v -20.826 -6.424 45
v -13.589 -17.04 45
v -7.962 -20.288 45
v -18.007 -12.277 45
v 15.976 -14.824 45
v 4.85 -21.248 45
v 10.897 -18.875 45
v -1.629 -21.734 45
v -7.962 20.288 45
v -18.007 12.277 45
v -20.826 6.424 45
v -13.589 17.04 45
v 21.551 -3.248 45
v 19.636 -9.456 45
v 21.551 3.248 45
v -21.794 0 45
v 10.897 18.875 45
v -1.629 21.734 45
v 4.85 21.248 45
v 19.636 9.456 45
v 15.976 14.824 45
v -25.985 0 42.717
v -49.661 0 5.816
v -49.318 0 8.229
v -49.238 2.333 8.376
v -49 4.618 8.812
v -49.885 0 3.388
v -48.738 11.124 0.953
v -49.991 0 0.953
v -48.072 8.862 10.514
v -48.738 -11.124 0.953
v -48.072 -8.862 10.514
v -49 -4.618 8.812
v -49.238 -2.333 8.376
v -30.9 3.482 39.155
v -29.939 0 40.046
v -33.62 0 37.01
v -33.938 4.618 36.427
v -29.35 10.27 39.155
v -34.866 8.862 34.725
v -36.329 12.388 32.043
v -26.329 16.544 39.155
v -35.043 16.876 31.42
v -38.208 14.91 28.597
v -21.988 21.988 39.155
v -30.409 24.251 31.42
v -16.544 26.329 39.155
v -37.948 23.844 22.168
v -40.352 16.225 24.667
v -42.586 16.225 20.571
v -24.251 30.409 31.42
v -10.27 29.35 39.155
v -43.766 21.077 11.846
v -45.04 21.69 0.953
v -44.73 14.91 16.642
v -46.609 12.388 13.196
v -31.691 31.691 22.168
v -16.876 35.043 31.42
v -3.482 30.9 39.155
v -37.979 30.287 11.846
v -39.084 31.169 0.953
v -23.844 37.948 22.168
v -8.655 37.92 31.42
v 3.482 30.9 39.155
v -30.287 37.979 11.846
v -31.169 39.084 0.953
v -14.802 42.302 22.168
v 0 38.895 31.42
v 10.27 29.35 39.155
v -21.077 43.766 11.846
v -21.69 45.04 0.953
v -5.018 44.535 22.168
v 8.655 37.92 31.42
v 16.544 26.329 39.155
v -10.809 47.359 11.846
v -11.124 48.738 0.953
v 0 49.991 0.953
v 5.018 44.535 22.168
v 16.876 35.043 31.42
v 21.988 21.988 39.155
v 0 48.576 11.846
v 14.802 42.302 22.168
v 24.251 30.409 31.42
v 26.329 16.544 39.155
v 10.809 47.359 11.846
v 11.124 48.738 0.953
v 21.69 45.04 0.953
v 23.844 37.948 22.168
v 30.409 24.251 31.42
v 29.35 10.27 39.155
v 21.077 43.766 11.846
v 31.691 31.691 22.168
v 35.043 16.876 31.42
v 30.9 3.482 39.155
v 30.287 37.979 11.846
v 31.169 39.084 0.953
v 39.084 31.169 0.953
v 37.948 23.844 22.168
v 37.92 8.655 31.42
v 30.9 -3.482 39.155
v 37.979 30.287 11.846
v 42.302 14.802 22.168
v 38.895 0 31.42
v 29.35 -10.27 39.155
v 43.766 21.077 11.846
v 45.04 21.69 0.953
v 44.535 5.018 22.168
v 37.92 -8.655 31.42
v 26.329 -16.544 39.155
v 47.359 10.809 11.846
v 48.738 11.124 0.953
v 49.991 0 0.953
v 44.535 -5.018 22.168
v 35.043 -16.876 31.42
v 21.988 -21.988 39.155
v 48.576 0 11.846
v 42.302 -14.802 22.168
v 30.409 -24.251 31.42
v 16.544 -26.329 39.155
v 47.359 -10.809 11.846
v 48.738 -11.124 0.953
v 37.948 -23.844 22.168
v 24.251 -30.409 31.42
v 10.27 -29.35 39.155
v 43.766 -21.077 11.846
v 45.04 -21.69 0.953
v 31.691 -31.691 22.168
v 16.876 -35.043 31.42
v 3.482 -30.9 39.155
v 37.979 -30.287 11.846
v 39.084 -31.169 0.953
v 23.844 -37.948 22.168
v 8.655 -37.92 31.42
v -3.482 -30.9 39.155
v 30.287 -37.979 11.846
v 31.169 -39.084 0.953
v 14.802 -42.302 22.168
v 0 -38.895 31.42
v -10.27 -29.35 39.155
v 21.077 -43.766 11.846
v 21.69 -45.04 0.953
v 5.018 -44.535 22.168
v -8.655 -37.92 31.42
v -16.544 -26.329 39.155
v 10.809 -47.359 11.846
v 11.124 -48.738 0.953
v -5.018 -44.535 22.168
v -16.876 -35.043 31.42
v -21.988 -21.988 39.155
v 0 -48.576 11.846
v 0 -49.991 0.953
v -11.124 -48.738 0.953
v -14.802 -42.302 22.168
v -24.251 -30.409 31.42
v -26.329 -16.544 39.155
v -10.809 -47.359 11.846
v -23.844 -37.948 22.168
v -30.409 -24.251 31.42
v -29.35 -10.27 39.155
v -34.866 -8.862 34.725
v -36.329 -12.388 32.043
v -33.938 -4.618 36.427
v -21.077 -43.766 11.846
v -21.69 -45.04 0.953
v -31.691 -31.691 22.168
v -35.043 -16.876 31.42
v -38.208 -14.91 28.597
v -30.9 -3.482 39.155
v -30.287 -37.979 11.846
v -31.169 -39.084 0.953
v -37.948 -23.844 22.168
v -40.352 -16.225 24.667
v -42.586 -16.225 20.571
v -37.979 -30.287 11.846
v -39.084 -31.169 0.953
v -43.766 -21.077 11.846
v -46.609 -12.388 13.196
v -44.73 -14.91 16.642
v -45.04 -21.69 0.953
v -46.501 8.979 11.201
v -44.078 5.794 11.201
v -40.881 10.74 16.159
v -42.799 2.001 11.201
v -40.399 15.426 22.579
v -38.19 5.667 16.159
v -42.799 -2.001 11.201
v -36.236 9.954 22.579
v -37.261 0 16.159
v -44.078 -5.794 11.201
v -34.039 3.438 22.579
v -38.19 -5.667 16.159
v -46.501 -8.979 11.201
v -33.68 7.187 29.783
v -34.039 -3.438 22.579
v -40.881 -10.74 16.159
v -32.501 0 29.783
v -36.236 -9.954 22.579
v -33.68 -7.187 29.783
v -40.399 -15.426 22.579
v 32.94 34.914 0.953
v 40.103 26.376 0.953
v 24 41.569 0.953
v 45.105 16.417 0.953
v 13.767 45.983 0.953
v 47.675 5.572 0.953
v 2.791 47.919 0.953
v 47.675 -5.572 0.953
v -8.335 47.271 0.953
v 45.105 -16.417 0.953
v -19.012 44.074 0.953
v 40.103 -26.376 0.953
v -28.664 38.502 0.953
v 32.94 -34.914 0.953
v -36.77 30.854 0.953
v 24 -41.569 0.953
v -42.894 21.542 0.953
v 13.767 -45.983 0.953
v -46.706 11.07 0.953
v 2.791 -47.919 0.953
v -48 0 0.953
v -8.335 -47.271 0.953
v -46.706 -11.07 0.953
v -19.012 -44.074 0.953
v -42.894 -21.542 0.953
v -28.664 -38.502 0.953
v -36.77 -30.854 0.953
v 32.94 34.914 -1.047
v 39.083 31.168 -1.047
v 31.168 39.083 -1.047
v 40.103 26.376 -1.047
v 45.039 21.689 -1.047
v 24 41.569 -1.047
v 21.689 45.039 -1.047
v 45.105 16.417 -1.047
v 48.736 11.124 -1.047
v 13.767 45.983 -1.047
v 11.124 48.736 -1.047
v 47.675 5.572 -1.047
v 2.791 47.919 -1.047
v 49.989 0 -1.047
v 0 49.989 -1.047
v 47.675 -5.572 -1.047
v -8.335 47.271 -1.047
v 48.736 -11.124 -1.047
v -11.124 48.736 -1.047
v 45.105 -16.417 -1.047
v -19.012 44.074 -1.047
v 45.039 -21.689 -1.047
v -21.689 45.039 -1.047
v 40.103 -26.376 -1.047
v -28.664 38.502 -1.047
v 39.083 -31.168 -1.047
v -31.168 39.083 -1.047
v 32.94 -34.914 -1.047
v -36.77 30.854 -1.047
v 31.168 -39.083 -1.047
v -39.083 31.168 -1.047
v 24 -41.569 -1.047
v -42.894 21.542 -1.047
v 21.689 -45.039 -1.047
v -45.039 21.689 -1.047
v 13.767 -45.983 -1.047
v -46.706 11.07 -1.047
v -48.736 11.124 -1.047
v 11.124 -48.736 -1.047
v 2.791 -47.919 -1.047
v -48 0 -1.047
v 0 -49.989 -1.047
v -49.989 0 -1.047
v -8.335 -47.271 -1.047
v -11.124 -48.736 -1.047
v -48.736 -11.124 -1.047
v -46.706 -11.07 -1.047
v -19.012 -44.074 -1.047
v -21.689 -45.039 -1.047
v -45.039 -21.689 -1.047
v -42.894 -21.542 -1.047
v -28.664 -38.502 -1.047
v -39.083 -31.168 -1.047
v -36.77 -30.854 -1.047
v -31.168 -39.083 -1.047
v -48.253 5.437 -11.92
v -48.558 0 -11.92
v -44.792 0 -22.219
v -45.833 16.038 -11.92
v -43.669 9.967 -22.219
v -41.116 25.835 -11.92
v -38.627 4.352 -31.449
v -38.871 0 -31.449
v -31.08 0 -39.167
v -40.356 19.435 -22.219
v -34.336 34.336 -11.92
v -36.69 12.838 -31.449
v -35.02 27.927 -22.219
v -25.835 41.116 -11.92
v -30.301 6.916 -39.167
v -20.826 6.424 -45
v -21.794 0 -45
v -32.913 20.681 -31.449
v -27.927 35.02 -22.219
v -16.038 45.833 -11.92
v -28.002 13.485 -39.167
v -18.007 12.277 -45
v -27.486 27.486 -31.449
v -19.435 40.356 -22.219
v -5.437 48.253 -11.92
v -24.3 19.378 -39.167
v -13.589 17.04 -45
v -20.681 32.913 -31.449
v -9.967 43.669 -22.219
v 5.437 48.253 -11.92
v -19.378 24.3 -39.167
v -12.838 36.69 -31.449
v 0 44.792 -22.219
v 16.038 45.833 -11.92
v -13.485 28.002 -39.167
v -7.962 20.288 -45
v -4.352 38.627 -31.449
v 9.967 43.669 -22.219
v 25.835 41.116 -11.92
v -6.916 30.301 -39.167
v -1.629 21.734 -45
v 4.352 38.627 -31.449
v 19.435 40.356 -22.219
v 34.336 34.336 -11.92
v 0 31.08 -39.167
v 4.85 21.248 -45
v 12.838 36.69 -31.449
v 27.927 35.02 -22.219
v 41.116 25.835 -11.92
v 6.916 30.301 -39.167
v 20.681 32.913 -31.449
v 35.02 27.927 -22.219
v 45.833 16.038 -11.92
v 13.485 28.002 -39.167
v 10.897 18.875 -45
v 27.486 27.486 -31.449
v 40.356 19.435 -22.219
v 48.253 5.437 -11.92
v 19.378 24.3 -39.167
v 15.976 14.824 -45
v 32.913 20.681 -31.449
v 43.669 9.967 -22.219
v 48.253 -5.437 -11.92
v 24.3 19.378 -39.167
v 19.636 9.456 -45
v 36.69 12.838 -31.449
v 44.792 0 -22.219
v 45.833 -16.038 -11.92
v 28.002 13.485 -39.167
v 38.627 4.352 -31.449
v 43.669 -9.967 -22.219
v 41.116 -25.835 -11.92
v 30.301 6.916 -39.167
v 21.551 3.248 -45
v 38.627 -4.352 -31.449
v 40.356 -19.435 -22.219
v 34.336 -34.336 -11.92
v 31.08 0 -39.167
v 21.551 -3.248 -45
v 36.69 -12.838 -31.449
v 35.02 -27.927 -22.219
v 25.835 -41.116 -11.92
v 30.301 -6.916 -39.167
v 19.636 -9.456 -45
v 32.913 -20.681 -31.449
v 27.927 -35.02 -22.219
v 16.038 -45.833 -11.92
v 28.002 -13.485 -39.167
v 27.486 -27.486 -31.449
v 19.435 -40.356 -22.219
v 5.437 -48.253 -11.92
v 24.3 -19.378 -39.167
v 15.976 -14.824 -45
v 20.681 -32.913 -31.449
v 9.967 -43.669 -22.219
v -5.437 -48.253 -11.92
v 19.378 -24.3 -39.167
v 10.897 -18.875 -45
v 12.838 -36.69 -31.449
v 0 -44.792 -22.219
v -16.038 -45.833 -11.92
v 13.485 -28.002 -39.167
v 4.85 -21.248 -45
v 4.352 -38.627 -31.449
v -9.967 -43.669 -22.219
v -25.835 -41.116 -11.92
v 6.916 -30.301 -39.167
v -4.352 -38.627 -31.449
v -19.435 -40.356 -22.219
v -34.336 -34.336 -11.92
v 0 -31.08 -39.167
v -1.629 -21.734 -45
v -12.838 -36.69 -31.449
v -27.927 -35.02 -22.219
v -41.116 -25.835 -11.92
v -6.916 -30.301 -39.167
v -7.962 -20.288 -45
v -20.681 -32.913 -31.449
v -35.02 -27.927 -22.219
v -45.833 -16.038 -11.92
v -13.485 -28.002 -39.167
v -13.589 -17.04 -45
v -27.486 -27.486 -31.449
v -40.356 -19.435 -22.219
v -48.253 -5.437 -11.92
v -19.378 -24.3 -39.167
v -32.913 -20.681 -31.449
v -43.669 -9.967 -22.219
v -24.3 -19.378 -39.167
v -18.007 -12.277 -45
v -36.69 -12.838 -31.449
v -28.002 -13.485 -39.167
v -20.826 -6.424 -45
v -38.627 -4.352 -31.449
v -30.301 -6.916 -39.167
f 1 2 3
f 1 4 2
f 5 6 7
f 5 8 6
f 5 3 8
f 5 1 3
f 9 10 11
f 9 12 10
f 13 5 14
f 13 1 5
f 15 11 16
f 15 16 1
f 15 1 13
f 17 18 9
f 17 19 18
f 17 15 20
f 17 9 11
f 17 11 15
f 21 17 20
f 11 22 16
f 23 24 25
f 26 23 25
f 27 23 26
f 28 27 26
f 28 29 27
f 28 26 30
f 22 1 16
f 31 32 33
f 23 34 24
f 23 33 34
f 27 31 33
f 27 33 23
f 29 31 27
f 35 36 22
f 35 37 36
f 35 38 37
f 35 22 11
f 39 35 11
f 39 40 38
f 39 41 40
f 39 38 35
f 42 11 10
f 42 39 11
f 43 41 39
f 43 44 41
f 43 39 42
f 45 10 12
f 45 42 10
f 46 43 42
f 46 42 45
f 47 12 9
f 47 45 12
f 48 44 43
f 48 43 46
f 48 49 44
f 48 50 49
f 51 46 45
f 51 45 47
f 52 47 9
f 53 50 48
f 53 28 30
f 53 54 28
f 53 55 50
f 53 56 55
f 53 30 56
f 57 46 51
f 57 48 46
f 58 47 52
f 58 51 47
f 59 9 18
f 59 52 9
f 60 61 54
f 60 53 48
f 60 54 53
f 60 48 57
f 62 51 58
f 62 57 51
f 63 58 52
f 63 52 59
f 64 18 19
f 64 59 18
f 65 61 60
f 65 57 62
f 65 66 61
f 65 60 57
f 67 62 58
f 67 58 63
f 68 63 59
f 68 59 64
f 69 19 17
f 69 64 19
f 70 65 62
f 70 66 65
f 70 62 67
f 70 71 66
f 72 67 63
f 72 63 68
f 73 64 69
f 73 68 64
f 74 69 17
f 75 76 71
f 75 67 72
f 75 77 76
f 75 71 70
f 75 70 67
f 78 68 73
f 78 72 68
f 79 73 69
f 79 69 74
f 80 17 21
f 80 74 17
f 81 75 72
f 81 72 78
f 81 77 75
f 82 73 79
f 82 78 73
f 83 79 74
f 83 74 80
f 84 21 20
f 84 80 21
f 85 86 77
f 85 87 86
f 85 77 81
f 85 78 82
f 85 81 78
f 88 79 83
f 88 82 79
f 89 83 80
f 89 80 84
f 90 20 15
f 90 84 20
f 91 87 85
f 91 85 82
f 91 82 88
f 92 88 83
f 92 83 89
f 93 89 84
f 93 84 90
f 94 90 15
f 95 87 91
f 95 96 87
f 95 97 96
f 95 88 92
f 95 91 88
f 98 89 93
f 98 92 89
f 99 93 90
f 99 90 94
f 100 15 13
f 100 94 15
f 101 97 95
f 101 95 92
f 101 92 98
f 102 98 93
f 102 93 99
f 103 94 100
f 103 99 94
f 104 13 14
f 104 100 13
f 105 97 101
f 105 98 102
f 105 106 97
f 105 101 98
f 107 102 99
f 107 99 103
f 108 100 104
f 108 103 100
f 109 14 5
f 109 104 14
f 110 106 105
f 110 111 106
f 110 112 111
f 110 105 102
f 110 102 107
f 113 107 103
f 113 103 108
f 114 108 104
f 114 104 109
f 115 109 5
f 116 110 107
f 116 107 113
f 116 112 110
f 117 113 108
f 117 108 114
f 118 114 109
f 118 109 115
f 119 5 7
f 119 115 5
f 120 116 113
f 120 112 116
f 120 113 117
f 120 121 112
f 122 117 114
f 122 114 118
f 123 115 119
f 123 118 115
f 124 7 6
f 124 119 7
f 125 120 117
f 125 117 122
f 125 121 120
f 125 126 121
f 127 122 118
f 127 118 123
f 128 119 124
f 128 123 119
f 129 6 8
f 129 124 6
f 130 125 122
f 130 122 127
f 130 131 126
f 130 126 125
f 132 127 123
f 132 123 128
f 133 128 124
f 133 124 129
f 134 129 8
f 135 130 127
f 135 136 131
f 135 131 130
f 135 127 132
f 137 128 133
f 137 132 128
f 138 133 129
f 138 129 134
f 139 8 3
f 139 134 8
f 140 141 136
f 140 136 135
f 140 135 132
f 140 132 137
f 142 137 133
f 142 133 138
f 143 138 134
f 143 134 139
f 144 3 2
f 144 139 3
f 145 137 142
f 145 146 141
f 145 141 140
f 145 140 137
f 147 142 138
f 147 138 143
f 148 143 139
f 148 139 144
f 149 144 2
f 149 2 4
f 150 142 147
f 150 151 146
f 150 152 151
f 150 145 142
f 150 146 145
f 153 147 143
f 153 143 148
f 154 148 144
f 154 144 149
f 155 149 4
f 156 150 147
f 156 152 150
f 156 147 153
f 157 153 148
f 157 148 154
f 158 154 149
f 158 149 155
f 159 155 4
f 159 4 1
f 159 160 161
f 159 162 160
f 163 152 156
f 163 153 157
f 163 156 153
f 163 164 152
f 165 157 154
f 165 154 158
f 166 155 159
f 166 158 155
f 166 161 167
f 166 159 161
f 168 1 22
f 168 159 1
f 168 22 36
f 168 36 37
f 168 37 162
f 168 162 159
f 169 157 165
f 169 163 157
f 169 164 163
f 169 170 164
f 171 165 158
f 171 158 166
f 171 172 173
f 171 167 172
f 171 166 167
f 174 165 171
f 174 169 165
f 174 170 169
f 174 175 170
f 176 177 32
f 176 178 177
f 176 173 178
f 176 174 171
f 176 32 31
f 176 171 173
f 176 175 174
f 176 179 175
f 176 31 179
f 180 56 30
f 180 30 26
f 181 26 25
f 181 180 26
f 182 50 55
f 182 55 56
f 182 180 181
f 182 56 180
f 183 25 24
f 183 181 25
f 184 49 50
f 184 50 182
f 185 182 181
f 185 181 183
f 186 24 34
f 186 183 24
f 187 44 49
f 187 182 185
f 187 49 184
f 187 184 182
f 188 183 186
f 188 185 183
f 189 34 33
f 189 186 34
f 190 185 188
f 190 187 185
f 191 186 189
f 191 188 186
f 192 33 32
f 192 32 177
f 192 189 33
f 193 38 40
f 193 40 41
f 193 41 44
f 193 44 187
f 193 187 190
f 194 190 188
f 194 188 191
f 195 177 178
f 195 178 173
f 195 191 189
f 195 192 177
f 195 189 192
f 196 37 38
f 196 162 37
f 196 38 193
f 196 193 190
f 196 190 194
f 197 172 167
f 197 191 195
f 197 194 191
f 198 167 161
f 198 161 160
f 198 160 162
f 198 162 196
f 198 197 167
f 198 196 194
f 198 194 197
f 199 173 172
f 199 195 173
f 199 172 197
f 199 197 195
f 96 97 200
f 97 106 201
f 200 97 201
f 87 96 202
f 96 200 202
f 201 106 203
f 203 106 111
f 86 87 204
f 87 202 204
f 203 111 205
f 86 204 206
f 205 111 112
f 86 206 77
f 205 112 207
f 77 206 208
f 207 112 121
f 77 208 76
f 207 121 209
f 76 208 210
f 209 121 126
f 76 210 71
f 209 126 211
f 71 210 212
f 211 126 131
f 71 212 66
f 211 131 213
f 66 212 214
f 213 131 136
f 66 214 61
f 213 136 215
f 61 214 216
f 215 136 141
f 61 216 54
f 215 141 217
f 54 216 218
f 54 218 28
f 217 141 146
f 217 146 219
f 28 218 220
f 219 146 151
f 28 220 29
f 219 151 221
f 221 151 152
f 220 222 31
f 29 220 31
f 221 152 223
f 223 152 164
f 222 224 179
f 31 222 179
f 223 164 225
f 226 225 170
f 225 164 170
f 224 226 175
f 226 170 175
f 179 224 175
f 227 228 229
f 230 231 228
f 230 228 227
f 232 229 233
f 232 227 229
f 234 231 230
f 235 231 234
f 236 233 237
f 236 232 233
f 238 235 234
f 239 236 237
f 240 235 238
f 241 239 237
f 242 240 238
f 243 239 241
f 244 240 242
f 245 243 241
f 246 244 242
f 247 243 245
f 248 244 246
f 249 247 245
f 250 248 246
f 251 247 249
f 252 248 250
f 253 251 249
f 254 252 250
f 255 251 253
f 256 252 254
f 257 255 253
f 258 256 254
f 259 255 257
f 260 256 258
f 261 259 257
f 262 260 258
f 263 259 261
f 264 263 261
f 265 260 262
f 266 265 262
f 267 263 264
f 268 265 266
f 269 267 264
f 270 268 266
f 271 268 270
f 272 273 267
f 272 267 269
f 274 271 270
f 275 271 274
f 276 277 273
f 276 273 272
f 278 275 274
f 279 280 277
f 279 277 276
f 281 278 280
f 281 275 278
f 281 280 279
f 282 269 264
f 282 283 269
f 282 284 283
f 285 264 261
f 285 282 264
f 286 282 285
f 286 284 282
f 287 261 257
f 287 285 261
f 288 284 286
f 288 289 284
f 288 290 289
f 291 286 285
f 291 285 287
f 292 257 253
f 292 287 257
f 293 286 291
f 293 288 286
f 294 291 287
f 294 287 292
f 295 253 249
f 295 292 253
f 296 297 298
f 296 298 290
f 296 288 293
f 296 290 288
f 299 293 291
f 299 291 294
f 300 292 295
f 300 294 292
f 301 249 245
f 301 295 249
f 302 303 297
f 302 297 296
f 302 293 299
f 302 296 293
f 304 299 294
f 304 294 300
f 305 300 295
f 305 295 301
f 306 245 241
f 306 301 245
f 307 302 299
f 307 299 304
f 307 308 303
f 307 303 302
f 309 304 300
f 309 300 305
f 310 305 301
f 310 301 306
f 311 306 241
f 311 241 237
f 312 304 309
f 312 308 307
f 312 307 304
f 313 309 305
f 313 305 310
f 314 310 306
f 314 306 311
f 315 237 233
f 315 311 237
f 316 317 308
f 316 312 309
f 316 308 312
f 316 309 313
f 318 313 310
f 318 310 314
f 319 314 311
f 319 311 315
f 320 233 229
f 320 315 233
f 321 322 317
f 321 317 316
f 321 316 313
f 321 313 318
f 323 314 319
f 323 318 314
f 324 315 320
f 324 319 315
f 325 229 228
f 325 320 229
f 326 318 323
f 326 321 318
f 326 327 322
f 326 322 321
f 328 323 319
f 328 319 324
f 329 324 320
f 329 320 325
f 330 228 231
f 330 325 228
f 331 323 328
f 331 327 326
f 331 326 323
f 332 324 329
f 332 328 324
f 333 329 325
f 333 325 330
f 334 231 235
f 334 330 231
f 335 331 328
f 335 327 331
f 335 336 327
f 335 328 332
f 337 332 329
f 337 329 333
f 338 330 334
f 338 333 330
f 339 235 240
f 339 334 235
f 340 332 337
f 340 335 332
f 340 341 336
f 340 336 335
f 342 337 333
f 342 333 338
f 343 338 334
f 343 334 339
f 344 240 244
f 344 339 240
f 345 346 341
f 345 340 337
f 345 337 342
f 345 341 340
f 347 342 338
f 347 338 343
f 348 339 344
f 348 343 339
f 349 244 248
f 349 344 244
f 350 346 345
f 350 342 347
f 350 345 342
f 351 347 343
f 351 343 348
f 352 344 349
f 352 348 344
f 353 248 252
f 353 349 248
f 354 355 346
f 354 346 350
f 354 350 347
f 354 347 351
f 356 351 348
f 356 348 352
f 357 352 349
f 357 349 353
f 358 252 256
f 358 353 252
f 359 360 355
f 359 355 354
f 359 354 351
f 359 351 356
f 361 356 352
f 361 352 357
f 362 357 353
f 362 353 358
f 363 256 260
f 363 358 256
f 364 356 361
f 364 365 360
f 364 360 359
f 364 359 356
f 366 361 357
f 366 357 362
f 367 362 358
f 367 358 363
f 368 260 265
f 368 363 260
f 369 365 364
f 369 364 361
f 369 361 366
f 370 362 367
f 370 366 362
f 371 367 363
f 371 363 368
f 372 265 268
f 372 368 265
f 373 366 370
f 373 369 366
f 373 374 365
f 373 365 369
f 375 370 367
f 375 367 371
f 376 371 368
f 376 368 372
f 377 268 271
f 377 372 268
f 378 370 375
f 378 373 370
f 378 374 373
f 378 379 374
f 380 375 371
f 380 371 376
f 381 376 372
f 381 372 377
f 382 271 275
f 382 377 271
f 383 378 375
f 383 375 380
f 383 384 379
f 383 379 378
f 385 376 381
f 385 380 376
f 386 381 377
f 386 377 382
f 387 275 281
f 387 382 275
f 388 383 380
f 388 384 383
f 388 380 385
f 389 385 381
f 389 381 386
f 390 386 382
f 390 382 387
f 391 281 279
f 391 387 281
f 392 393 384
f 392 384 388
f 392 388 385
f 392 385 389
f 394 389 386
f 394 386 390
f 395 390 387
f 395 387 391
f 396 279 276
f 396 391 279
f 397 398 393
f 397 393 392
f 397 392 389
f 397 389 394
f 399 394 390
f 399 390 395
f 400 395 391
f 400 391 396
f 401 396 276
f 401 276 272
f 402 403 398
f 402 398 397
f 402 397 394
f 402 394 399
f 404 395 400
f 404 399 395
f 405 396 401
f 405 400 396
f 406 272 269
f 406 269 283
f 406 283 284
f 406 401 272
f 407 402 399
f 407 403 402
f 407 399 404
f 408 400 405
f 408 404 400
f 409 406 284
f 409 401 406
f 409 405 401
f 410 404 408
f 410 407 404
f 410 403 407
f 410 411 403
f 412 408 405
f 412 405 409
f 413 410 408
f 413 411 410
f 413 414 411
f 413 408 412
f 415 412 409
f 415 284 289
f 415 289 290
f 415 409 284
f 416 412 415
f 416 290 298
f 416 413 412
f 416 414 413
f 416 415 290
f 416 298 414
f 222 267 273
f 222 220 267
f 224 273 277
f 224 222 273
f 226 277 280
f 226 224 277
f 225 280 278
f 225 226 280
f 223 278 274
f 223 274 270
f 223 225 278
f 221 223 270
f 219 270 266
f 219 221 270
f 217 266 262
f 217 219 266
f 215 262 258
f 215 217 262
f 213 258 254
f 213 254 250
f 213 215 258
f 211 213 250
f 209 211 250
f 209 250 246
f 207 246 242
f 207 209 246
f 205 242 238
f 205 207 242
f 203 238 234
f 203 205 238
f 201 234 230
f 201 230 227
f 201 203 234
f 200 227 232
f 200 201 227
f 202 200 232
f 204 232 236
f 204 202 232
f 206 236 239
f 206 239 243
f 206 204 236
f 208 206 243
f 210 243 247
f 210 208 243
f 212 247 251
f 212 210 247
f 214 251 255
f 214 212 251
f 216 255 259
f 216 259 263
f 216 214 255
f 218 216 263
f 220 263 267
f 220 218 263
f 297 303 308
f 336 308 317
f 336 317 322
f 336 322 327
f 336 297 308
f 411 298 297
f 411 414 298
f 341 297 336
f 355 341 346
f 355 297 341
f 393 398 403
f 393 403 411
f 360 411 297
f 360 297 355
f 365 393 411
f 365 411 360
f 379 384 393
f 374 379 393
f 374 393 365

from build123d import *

# Parameters (mm, degrees)
F4_W          = 98.152165938
F4_H          = 19.5652123008
F5_DEPTH      = 25
F5_DEPTH_BACK = 25
F6_W          = 12.6501991157
F6_H          = 2


# Not quite as in the source:
# - a pattern or mirror of a feature is missing from the dataset's text; its kind, count and spacing are read off the source's solid


with BuildPart() as f1:
    # F0 (on Front) → F1 (revolve)
    with BuildSketch(Plane.XZ):
        with BuildLine():
            Line((0, -50), (0, 50))
            ThreePointArc((0, 50), (-50, 0), (0, -50))
        make_face()
    revolve(axis=Axis((0, 0, 0), (0, 0, -1)))

    # F2 (on Front) → F3 (revolve, cut)
    with BuildSketch(Plane.XZ):
        with BuildLine():
            Line((-55, 52.5), (-55, 7.5))
            ThreePointArc((-55, 7.5), (-32.5, 30), (-55, 52.5))
        make_face()
    revolve(axis=Axis((-55, 0, 30), (0, 0, -1)), mode=Mode.SUBTRACT)

    # F4 (on Front) → F5 (cut, two sides)
    with BuildSketch(Plane.XZ) as f5_sk:
        with Locations((0.7781628519, 54.7826061504)):
            Rectangle(F4_W, F4_H)
    f5 = extrude(amount=-F5_DEPTH, mode=Mode.SUBTRACT) + extrude(f5_sk.sketch, amount=F5_DEPTH_BACK, mode=Mode.SUBTRACT)

    # F5_copies: F5 across plane
    add(f5.mirror(Plane(origin=(0, 0, 0), x_dir=(-1, 0, 0), z_dir=(0, 0, -1))), mode=Mode.SUBTRACT)

    # F6 (on Front) → F7 (revolve, cut)
    with BuildSketch(Plane.XZ):
        with Locations((-54.3250995579, -0.0474521765)):
            Rectangle(F6_W, F6_H)
    revolve(axis=Axis((0, 0, 21.1794096977), (0, 0, 1)), mode=Mode.SUBTRACT)


solid = f1.part
